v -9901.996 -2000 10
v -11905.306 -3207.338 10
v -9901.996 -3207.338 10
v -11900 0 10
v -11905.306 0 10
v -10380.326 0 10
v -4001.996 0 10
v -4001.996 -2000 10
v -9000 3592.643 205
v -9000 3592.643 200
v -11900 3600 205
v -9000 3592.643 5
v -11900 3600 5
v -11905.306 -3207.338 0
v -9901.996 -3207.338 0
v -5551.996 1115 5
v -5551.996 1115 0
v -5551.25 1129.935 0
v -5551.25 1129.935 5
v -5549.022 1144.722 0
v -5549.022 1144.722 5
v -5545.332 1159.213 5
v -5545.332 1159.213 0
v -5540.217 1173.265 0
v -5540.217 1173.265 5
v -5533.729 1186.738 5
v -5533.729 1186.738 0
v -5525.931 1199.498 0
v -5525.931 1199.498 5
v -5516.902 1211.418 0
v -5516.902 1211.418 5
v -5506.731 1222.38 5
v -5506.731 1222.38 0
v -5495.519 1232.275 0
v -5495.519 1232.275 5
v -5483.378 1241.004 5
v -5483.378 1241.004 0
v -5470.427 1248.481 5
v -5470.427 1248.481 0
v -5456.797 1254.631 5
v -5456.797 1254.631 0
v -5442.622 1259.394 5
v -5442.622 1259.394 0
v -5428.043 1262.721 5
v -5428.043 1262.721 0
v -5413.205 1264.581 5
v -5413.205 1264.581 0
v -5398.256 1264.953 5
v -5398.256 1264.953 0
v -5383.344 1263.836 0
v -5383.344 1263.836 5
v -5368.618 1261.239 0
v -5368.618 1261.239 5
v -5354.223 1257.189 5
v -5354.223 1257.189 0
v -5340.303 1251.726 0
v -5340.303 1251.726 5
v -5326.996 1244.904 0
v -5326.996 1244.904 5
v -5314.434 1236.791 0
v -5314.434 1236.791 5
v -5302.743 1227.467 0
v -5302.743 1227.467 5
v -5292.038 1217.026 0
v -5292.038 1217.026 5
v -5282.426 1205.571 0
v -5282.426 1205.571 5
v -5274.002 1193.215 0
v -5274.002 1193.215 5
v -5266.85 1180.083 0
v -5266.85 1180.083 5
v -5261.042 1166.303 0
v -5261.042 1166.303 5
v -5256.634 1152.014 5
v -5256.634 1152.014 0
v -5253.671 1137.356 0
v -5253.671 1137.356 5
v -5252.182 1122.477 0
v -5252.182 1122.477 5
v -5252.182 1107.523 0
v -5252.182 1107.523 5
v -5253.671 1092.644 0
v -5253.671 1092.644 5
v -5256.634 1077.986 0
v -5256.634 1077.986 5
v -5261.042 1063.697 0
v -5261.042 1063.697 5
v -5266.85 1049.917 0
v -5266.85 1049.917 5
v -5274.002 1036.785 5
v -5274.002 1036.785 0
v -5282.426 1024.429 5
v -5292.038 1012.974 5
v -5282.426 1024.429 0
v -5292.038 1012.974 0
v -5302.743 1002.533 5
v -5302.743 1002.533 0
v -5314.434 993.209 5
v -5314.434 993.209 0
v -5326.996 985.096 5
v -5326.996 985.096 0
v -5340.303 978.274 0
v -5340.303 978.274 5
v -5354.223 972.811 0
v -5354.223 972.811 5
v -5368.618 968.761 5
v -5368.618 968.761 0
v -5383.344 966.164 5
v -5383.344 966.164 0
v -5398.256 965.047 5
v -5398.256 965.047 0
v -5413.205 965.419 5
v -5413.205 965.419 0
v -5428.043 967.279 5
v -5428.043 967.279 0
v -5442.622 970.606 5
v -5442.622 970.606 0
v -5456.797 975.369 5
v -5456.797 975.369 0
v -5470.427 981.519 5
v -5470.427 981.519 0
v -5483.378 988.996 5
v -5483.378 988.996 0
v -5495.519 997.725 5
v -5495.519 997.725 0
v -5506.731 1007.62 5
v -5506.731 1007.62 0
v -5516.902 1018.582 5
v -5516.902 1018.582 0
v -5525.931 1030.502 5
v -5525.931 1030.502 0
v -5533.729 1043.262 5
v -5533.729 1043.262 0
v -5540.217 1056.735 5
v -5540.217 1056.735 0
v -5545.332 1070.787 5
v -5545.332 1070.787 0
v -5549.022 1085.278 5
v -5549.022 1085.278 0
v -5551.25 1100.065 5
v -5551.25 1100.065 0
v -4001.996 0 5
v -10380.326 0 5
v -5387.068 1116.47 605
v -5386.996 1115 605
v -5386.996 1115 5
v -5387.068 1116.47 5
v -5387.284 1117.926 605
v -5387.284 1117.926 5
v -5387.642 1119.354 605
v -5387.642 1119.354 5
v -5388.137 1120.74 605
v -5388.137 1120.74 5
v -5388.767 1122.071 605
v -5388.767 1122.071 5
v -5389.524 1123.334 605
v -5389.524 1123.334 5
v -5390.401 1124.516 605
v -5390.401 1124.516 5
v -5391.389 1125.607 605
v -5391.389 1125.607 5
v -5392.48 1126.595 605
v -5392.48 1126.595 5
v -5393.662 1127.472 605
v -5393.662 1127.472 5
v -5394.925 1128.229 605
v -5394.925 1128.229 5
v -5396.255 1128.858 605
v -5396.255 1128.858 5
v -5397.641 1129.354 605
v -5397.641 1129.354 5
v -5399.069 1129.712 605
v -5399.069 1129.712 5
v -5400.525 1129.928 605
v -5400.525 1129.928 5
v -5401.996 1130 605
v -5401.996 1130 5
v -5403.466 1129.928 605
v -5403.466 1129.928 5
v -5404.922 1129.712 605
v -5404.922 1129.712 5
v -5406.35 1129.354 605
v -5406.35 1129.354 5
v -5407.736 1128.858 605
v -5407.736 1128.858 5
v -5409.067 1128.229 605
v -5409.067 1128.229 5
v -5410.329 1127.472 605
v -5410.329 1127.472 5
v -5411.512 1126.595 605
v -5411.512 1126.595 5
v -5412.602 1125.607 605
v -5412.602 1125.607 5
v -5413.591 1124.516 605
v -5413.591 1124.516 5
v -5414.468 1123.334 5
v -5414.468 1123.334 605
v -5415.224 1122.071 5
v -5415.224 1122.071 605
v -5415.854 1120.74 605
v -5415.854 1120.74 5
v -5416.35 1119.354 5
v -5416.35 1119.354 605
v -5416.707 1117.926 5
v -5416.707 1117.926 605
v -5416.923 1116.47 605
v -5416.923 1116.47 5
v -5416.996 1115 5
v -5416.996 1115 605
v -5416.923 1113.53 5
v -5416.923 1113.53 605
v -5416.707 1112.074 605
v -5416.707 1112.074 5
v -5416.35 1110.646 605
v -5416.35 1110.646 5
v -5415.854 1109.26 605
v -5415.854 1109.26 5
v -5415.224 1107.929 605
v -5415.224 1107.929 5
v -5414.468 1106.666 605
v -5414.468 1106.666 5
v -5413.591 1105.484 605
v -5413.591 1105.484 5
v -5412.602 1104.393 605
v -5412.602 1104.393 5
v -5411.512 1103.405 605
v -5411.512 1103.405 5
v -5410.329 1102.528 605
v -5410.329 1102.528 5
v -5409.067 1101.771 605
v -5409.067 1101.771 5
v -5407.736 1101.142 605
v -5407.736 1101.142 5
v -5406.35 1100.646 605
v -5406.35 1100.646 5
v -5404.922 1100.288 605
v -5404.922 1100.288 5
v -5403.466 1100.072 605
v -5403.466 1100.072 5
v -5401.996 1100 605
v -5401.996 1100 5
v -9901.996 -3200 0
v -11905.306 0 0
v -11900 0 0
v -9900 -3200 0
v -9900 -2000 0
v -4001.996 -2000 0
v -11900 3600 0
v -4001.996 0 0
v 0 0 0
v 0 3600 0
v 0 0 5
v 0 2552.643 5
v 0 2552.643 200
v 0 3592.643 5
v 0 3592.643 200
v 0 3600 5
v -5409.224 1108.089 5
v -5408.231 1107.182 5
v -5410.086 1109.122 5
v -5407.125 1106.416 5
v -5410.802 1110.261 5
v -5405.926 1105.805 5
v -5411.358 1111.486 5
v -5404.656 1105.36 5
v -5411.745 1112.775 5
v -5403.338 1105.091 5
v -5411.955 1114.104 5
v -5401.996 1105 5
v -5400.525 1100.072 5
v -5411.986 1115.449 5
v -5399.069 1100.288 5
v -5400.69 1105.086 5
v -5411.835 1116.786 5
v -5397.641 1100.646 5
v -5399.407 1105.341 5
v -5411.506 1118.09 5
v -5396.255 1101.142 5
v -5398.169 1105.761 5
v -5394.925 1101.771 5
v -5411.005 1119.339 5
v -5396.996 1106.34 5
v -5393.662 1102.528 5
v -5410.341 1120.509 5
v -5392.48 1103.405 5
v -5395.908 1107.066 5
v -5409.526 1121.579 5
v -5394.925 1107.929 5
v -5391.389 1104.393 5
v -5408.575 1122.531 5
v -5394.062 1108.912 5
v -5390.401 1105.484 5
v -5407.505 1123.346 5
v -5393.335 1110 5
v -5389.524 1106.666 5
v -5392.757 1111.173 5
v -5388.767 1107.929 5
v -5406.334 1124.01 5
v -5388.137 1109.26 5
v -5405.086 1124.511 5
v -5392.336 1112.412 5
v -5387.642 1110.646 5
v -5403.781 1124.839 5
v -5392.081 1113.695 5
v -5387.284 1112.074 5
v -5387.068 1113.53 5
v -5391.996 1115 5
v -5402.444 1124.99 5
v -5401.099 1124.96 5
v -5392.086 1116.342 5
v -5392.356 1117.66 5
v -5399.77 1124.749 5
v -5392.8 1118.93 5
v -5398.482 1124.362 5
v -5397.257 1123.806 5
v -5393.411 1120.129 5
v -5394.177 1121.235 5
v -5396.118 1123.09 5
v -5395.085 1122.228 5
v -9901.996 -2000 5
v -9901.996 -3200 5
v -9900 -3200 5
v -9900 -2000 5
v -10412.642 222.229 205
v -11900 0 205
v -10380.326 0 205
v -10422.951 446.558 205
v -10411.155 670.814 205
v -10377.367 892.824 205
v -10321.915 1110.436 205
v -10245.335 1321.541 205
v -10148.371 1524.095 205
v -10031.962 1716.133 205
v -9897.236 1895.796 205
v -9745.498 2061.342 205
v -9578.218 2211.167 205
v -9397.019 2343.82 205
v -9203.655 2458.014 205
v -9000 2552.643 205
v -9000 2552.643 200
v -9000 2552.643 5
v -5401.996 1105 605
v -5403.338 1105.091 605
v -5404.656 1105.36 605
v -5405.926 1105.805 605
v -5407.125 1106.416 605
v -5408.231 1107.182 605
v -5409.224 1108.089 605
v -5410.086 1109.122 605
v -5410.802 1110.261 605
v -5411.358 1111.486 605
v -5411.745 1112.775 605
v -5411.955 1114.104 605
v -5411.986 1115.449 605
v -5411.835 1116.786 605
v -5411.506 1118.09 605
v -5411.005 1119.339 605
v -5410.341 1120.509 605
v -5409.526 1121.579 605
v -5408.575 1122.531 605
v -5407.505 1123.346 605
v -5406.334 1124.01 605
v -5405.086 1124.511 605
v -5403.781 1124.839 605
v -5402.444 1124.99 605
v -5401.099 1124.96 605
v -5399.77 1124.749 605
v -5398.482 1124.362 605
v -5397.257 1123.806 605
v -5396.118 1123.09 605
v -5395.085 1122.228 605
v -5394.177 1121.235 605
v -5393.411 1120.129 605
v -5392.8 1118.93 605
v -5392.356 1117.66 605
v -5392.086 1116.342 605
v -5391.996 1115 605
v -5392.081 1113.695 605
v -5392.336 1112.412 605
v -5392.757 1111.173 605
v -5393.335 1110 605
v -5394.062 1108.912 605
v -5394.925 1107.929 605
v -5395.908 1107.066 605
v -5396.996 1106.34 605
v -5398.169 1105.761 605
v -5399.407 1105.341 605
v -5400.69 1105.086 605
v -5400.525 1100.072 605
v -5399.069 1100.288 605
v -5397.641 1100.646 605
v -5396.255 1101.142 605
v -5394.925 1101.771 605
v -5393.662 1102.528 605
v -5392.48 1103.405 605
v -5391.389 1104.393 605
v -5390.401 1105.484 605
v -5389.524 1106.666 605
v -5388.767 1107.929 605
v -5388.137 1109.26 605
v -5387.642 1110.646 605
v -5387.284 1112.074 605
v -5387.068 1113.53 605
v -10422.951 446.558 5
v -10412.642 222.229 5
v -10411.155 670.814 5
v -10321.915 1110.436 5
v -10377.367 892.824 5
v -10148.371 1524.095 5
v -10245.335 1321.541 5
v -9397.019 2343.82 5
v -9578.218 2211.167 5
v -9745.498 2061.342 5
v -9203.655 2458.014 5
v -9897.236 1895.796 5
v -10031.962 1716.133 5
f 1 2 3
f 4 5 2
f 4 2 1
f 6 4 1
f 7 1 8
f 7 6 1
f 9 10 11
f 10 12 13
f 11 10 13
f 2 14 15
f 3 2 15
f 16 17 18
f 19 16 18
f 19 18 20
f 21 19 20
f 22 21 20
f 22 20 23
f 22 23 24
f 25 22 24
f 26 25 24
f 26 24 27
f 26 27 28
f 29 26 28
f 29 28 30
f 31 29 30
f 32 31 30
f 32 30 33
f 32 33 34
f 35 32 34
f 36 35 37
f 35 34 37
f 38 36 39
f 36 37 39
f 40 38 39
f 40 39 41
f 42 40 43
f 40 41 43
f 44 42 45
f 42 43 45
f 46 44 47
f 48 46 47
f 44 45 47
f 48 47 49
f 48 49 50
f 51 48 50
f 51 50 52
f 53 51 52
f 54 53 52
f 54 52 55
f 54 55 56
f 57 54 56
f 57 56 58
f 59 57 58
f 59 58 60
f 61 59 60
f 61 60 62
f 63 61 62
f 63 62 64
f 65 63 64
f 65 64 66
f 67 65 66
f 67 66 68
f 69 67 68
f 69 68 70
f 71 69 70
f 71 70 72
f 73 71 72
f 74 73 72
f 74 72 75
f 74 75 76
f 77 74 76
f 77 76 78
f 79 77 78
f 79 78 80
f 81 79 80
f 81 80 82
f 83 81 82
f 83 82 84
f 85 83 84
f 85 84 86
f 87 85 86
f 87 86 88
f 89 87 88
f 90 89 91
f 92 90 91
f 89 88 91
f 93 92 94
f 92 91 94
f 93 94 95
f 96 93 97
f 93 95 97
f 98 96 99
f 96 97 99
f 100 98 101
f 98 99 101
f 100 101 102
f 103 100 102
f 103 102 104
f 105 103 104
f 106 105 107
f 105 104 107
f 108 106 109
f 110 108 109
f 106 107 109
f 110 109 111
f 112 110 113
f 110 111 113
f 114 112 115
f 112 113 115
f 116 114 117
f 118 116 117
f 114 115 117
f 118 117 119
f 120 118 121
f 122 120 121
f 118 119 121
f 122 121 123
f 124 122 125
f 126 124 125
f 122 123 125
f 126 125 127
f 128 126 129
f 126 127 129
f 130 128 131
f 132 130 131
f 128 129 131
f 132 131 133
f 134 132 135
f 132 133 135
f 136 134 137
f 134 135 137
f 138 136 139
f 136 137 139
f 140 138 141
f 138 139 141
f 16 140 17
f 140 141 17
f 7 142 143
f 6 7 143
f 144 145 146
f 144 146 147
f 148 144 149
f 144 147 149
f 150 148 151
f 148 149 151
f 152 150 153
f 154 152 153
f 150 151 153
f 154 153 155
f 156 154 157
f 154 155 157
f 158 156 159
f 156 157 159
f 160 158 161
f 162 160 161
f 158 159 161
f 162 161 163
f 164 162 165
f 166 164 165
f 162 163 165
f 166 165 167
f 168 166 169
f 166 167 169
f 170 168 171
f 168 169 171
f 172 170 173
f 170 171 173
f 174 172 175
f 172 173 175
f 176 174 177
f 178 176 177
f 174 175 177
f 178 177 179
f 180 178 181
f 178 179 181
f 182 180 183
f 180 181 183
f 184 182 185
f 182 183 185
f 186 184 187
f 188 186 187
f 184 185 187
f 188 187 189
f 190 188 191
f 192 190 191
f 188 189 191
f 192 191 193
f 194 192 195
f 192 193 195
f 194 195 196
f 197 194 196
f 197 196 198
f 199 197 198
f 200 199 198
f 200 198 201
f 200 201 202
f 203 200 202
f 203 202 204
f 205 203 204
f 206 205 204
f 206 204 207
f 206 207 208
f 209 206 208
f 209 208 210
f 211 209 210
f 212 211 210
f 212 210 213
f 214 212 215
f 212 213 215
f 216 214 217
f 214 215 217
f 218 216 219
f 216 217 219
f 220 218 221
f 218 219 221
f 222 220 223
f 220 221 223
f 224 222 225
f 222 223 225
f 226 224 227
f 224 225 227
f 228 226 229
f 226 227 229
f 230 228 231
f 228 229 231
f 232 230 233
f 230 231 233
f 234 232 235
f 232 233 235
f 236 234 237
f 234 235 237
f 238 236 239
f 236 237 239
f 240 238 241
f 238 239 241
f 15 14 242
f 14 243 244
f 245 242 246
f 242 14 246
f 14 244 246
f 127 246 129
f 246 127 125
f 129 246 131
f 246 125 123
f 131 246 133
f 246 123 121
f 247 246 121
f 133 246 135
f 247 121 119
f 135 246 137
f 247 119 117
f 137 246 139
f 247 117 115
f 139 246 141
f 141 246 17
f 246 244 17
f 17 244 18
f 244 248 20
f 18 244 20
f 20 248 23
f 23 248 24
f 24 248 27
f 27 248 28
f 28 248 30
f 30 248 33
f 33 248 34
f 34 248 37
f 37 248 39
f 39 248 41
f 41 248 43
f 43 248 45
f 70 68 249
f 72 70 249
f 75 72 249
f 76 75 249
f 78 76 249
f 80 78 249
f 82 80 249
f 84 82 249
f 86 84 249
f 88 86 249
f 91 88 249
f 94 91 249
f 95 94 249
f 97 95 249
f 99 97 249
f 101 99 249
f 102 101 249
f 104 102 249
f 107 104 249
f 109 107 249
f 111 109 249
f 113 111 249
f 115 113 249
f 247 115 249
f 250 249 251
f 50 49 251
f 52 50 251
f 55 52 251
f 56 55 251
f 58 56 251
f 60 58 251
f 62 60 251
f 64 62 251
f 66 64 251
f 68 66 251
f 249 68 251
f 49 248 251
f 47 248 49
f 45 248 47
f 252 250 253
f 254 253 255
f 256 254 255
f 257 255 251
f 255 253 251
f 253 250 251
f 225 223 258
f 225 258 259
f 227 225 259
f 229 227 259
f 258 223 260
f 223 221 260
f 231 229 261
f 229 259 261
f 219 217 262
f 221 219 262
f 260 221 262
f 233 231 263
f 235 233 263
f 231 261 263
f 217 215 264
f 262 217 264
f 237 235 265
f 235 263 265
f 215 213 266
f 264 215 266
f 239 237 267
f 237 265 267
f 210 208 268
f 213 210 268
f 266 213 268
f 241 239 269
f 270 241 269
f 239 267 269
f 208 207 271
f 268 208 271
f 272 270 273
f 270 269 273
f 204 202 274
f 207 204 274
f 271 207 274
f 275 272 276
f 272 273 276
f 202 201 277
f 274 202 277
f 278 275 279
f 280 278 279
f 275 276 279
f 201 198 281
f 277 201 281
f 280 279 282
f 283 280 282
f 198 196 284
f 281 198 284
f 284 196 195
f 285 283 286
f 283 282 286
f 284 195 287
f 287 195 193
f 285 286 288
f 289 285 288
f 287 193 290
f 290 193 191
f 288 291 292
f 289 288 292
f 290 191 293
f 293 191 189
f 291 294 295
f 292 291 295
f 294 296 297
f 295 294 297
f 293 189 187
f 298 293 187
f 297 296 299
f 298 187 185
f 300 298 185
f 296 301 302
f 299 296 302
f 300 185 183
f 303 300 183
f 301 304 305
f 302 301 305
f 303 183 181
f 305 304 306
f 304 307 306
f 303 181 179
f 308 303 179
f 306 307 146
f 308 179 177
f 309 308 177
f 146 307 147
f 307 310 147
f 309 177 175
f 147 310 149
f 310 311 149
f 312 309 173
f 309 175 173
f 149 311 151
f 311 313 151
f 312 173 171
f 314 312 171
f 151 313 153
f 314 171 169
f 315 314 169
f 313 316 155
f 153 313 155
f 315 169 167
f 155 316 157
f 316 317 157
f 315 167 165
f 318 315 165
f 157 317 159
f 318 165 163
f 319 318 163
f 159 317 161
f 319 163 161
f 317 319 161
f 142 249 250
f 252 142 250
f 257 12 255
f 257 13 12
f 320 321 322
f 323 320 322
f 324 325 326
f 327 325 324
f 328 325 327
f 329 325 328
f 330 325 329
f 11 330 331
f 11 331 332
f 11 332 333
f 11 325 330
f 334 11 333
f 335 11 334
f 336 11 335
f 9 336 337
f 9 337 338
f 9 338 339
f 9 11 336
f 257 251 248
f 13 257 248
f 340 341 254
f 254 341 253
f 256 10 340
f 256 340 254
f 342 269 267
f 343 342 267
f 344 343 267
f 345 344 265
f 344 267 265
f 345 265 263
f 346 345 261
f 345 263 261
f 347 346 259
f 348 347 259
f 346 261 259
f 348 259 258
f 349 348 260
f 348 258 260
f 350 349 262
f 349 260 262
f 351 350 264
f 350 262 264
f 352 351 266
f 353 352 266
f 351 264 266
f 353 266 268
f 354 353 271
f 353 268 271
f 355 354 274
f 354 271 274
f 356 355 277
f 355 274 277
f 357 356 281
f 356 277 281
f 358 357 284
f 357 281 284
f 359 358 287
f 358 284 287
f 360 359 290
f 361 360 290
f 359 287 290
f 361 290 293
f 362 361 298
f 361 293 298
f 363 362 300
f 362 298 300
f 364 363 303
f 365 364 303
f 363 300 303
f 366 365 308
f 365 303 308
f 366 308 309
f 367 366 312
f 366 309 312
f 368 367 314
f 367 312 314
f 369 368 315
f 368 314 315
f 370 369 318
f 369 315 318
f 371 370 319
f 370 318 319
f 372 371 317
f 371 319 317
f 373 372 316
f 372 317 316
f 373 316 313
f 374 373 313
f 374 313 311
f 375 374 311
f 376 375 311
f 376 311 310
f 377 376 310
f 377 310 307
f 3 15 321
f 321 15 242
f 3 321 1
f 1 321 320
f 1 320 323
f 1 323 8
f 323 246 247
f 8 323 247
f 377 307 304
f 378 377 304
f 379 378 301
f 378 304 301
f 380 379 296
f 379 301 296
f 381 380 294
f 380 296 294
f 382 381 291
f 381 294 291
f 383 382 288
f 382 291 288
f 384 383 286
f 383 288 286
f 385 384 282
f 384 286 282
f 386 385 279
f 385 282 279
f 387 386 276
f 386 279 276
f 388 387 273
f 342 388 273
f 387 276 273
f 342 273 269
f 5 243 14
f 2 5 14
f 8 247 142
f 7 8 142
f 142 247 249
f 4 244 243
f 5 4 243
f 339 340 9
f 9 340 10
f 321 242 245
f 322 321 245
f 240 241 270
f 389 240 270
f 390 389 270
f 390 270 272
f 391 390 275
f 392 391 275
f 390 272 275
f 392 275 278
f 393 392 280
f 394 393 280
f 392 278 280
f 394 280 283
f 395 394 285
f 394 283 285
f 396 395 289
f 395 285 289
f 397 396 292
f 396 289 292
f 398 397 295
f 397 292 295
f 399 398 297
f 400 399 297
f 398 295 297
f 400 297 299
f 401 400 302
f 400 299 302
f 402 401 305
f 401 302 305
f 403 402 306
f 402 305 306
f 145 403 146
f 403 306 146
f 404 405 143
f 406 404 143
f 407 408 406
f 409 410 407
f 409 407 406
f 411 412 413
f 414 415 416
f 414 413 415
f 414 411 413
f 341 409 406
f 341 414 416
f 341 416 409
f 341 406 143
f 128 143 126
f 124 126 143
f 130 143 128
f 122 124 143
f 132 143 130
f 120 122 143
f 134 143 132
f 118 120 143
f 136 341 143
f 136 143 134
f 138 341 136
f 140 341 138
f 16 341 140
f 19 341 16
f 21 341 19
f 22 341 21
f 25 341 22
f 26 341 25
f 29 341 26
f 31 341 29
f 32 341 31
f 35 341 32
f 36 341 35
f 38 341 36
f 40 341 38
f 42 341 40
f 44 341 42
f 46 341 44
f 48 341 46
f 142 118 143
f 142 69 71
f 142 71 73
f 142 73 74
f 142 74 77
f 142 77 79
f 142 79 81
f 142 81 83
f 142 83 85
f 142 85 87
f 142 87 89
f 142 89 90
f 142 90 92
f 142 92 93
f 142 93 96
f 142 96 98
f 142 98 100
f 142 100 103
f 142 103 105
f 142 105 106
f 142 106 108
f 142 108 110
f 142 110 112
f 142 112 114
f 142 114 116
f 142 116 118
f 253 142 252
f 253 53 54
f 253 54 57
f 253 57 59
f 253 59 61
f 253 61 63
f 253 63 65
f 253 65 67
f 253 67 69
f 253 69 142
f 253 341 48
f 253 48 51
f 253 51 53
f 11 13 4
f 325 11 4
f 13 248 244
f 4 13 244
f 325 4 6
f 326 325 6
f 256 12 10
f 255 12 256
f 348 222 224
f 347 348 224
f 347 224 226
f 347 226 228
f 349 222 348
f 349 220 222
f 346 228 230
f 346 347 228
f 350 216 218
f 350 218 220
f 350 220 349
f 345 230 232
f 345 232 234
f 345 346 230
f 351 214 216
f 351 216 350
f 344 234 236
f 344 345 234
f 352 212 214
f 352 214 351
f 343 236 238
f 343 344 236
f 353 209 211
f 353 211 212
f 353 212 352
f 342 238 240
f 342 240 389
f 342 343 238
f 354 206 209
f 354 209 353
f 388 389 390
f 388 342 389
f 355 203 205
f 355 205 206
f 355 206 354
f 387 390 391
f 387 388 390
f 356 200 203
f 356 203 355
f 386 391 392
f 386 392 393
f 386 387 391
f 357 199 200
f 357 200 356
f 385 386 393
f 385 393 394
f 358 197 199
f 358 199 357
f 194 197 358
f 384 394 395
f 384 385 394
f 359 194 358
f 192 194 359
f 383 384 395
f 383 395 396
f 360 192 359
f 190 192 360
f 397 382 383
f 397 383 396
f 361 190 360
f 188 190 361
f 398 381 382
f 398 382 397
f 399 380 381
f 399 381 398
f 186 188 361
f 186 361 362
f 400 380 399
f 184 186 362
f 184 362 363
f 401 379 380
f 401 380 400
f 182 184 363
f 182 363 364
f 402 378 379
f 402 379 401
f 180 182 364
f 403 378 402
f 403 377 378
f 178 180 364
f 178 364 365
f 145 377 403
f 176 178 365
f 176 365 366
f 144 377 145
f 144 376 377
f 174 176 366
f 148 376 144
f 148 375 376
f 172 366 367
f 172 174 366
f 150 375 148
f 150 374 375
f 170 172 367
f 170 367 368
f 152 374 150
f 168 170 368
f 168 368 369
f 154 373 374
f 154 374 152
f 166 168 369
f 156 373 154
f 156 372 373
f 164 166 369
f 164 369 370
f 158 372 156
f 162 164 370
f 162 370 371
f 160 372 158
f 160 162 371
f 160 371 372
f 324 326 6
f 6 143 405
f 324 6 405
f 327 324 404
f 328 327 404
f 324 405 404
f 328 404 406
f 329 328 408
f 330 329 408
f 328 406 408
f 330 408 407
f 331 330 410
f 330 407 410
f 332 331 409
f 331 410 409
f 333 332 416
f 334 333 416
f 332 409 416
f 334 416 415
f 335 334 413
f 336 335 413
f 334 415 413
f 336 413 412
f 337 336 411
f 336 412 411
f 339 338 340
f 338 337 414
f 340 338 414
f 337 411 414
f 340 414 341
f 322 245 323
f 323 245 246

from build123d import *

# Parameters (mm, degrees)
F1_DEPTH  = 5
F3_DEPTH  = 10
F4_W      = 9000
F4_H      = 1040
F5_DEPTH  = 200
F7_D      = 300
F9_DEPTH  = 600
F11_DEPTH = 200


with BuildPart() as f1:
    # F0 (on Top) → F1 (new body)
    with BuildSketch(Plane.XY):
        Polygon((-4000, 0), (0, 0), (0, 3600), (-11900, 3600), (-11900, -3200), (-9900, -3200), (-9900, -2000), (-9900, 0), align=None)
    extrude(amount=F1_DEPTH)

    # F2 (on Top) → F3 (join)
    with BuildSketch(Plane.XY):
        Polygon((-4001.995659, 0), (-9901.995659, 0), (-11905.305862, 0), (-11905.305862, -3207.338095), (-9901.995659, -3207.338095), (-9901.995659, -2000), (-4001.995659, -2000), align=None)
    extrude(amount=F3_DEPTH)

    # F4 (on Top) → F5 (join)
    with BuildSketch(Plane.XY):
        with Locations((-4500, 3072.643023)):
            Rectangle(F4_W, F4_H)
    extrude(amount=F5_DEPTH)

    # F7 (through all)
    with Locations(Plane.XY.offset(5)):
        with Locations((-5401.995659, 1115)):
            Hole(F7_D / 2)

    # F10 (on face) → F11 (join)
    with BuildSketch(Plane.XY.offset(5)):
        with BuildLine():
            ThreePointArc((-10380.326271, 0), (-10148.371333, 1524.094822), (-9000, 2552.643023))
            Line((-9000, 2552.643023), (-9000, 3592.643023))
            Line((-9000, 3592.643023), (-11900, 3600))
            Line((-11900, 3600), (-11900, 0))
            Line((-11900, 0), (-10380.326271, 0))
        make_face()
    extrude(amount=F11_DEPTH)


with BuildPart() as f9:
    # F8 (on face) → F9 (new body)
    with BuildSketch(Plane.XY.offset(5)):
        with BuildLine():
            ThreePointArc((-5391.995659, 1115), (-5409.066727, 1122.071068), (-5401.995659, 1105))
            ThreePointArc((-5401.995659, 1105), (-5394.924591, 1107.928932), (-5391.995659, 1115))
        make_face()
        with BuildLine():
            ThreePointArc((-5386.995659, 1115), (-5412.602261, 1125.606602), (-5401.995659, 1100))
            ThreePointArc((-5401.995659, 1100), (-5391.389057, 1104.393398), (-5386.995659, 1115))
        make_face()
        with BuildLine():
            ThreePointArc((-5391.995659, 1115), (-5394.924591, 1107.928932), (-5401.995659, 1105))
            ThreePointArc((-5401.995659, 1105), (-5409.066727, 1122.071068), (-5391.995659, 1115))
        make_face(mode=Mode.SUBTRACT)
    extrude(amount=F9_DEPTH)


solid = Compound([f1.part, f9.part])
